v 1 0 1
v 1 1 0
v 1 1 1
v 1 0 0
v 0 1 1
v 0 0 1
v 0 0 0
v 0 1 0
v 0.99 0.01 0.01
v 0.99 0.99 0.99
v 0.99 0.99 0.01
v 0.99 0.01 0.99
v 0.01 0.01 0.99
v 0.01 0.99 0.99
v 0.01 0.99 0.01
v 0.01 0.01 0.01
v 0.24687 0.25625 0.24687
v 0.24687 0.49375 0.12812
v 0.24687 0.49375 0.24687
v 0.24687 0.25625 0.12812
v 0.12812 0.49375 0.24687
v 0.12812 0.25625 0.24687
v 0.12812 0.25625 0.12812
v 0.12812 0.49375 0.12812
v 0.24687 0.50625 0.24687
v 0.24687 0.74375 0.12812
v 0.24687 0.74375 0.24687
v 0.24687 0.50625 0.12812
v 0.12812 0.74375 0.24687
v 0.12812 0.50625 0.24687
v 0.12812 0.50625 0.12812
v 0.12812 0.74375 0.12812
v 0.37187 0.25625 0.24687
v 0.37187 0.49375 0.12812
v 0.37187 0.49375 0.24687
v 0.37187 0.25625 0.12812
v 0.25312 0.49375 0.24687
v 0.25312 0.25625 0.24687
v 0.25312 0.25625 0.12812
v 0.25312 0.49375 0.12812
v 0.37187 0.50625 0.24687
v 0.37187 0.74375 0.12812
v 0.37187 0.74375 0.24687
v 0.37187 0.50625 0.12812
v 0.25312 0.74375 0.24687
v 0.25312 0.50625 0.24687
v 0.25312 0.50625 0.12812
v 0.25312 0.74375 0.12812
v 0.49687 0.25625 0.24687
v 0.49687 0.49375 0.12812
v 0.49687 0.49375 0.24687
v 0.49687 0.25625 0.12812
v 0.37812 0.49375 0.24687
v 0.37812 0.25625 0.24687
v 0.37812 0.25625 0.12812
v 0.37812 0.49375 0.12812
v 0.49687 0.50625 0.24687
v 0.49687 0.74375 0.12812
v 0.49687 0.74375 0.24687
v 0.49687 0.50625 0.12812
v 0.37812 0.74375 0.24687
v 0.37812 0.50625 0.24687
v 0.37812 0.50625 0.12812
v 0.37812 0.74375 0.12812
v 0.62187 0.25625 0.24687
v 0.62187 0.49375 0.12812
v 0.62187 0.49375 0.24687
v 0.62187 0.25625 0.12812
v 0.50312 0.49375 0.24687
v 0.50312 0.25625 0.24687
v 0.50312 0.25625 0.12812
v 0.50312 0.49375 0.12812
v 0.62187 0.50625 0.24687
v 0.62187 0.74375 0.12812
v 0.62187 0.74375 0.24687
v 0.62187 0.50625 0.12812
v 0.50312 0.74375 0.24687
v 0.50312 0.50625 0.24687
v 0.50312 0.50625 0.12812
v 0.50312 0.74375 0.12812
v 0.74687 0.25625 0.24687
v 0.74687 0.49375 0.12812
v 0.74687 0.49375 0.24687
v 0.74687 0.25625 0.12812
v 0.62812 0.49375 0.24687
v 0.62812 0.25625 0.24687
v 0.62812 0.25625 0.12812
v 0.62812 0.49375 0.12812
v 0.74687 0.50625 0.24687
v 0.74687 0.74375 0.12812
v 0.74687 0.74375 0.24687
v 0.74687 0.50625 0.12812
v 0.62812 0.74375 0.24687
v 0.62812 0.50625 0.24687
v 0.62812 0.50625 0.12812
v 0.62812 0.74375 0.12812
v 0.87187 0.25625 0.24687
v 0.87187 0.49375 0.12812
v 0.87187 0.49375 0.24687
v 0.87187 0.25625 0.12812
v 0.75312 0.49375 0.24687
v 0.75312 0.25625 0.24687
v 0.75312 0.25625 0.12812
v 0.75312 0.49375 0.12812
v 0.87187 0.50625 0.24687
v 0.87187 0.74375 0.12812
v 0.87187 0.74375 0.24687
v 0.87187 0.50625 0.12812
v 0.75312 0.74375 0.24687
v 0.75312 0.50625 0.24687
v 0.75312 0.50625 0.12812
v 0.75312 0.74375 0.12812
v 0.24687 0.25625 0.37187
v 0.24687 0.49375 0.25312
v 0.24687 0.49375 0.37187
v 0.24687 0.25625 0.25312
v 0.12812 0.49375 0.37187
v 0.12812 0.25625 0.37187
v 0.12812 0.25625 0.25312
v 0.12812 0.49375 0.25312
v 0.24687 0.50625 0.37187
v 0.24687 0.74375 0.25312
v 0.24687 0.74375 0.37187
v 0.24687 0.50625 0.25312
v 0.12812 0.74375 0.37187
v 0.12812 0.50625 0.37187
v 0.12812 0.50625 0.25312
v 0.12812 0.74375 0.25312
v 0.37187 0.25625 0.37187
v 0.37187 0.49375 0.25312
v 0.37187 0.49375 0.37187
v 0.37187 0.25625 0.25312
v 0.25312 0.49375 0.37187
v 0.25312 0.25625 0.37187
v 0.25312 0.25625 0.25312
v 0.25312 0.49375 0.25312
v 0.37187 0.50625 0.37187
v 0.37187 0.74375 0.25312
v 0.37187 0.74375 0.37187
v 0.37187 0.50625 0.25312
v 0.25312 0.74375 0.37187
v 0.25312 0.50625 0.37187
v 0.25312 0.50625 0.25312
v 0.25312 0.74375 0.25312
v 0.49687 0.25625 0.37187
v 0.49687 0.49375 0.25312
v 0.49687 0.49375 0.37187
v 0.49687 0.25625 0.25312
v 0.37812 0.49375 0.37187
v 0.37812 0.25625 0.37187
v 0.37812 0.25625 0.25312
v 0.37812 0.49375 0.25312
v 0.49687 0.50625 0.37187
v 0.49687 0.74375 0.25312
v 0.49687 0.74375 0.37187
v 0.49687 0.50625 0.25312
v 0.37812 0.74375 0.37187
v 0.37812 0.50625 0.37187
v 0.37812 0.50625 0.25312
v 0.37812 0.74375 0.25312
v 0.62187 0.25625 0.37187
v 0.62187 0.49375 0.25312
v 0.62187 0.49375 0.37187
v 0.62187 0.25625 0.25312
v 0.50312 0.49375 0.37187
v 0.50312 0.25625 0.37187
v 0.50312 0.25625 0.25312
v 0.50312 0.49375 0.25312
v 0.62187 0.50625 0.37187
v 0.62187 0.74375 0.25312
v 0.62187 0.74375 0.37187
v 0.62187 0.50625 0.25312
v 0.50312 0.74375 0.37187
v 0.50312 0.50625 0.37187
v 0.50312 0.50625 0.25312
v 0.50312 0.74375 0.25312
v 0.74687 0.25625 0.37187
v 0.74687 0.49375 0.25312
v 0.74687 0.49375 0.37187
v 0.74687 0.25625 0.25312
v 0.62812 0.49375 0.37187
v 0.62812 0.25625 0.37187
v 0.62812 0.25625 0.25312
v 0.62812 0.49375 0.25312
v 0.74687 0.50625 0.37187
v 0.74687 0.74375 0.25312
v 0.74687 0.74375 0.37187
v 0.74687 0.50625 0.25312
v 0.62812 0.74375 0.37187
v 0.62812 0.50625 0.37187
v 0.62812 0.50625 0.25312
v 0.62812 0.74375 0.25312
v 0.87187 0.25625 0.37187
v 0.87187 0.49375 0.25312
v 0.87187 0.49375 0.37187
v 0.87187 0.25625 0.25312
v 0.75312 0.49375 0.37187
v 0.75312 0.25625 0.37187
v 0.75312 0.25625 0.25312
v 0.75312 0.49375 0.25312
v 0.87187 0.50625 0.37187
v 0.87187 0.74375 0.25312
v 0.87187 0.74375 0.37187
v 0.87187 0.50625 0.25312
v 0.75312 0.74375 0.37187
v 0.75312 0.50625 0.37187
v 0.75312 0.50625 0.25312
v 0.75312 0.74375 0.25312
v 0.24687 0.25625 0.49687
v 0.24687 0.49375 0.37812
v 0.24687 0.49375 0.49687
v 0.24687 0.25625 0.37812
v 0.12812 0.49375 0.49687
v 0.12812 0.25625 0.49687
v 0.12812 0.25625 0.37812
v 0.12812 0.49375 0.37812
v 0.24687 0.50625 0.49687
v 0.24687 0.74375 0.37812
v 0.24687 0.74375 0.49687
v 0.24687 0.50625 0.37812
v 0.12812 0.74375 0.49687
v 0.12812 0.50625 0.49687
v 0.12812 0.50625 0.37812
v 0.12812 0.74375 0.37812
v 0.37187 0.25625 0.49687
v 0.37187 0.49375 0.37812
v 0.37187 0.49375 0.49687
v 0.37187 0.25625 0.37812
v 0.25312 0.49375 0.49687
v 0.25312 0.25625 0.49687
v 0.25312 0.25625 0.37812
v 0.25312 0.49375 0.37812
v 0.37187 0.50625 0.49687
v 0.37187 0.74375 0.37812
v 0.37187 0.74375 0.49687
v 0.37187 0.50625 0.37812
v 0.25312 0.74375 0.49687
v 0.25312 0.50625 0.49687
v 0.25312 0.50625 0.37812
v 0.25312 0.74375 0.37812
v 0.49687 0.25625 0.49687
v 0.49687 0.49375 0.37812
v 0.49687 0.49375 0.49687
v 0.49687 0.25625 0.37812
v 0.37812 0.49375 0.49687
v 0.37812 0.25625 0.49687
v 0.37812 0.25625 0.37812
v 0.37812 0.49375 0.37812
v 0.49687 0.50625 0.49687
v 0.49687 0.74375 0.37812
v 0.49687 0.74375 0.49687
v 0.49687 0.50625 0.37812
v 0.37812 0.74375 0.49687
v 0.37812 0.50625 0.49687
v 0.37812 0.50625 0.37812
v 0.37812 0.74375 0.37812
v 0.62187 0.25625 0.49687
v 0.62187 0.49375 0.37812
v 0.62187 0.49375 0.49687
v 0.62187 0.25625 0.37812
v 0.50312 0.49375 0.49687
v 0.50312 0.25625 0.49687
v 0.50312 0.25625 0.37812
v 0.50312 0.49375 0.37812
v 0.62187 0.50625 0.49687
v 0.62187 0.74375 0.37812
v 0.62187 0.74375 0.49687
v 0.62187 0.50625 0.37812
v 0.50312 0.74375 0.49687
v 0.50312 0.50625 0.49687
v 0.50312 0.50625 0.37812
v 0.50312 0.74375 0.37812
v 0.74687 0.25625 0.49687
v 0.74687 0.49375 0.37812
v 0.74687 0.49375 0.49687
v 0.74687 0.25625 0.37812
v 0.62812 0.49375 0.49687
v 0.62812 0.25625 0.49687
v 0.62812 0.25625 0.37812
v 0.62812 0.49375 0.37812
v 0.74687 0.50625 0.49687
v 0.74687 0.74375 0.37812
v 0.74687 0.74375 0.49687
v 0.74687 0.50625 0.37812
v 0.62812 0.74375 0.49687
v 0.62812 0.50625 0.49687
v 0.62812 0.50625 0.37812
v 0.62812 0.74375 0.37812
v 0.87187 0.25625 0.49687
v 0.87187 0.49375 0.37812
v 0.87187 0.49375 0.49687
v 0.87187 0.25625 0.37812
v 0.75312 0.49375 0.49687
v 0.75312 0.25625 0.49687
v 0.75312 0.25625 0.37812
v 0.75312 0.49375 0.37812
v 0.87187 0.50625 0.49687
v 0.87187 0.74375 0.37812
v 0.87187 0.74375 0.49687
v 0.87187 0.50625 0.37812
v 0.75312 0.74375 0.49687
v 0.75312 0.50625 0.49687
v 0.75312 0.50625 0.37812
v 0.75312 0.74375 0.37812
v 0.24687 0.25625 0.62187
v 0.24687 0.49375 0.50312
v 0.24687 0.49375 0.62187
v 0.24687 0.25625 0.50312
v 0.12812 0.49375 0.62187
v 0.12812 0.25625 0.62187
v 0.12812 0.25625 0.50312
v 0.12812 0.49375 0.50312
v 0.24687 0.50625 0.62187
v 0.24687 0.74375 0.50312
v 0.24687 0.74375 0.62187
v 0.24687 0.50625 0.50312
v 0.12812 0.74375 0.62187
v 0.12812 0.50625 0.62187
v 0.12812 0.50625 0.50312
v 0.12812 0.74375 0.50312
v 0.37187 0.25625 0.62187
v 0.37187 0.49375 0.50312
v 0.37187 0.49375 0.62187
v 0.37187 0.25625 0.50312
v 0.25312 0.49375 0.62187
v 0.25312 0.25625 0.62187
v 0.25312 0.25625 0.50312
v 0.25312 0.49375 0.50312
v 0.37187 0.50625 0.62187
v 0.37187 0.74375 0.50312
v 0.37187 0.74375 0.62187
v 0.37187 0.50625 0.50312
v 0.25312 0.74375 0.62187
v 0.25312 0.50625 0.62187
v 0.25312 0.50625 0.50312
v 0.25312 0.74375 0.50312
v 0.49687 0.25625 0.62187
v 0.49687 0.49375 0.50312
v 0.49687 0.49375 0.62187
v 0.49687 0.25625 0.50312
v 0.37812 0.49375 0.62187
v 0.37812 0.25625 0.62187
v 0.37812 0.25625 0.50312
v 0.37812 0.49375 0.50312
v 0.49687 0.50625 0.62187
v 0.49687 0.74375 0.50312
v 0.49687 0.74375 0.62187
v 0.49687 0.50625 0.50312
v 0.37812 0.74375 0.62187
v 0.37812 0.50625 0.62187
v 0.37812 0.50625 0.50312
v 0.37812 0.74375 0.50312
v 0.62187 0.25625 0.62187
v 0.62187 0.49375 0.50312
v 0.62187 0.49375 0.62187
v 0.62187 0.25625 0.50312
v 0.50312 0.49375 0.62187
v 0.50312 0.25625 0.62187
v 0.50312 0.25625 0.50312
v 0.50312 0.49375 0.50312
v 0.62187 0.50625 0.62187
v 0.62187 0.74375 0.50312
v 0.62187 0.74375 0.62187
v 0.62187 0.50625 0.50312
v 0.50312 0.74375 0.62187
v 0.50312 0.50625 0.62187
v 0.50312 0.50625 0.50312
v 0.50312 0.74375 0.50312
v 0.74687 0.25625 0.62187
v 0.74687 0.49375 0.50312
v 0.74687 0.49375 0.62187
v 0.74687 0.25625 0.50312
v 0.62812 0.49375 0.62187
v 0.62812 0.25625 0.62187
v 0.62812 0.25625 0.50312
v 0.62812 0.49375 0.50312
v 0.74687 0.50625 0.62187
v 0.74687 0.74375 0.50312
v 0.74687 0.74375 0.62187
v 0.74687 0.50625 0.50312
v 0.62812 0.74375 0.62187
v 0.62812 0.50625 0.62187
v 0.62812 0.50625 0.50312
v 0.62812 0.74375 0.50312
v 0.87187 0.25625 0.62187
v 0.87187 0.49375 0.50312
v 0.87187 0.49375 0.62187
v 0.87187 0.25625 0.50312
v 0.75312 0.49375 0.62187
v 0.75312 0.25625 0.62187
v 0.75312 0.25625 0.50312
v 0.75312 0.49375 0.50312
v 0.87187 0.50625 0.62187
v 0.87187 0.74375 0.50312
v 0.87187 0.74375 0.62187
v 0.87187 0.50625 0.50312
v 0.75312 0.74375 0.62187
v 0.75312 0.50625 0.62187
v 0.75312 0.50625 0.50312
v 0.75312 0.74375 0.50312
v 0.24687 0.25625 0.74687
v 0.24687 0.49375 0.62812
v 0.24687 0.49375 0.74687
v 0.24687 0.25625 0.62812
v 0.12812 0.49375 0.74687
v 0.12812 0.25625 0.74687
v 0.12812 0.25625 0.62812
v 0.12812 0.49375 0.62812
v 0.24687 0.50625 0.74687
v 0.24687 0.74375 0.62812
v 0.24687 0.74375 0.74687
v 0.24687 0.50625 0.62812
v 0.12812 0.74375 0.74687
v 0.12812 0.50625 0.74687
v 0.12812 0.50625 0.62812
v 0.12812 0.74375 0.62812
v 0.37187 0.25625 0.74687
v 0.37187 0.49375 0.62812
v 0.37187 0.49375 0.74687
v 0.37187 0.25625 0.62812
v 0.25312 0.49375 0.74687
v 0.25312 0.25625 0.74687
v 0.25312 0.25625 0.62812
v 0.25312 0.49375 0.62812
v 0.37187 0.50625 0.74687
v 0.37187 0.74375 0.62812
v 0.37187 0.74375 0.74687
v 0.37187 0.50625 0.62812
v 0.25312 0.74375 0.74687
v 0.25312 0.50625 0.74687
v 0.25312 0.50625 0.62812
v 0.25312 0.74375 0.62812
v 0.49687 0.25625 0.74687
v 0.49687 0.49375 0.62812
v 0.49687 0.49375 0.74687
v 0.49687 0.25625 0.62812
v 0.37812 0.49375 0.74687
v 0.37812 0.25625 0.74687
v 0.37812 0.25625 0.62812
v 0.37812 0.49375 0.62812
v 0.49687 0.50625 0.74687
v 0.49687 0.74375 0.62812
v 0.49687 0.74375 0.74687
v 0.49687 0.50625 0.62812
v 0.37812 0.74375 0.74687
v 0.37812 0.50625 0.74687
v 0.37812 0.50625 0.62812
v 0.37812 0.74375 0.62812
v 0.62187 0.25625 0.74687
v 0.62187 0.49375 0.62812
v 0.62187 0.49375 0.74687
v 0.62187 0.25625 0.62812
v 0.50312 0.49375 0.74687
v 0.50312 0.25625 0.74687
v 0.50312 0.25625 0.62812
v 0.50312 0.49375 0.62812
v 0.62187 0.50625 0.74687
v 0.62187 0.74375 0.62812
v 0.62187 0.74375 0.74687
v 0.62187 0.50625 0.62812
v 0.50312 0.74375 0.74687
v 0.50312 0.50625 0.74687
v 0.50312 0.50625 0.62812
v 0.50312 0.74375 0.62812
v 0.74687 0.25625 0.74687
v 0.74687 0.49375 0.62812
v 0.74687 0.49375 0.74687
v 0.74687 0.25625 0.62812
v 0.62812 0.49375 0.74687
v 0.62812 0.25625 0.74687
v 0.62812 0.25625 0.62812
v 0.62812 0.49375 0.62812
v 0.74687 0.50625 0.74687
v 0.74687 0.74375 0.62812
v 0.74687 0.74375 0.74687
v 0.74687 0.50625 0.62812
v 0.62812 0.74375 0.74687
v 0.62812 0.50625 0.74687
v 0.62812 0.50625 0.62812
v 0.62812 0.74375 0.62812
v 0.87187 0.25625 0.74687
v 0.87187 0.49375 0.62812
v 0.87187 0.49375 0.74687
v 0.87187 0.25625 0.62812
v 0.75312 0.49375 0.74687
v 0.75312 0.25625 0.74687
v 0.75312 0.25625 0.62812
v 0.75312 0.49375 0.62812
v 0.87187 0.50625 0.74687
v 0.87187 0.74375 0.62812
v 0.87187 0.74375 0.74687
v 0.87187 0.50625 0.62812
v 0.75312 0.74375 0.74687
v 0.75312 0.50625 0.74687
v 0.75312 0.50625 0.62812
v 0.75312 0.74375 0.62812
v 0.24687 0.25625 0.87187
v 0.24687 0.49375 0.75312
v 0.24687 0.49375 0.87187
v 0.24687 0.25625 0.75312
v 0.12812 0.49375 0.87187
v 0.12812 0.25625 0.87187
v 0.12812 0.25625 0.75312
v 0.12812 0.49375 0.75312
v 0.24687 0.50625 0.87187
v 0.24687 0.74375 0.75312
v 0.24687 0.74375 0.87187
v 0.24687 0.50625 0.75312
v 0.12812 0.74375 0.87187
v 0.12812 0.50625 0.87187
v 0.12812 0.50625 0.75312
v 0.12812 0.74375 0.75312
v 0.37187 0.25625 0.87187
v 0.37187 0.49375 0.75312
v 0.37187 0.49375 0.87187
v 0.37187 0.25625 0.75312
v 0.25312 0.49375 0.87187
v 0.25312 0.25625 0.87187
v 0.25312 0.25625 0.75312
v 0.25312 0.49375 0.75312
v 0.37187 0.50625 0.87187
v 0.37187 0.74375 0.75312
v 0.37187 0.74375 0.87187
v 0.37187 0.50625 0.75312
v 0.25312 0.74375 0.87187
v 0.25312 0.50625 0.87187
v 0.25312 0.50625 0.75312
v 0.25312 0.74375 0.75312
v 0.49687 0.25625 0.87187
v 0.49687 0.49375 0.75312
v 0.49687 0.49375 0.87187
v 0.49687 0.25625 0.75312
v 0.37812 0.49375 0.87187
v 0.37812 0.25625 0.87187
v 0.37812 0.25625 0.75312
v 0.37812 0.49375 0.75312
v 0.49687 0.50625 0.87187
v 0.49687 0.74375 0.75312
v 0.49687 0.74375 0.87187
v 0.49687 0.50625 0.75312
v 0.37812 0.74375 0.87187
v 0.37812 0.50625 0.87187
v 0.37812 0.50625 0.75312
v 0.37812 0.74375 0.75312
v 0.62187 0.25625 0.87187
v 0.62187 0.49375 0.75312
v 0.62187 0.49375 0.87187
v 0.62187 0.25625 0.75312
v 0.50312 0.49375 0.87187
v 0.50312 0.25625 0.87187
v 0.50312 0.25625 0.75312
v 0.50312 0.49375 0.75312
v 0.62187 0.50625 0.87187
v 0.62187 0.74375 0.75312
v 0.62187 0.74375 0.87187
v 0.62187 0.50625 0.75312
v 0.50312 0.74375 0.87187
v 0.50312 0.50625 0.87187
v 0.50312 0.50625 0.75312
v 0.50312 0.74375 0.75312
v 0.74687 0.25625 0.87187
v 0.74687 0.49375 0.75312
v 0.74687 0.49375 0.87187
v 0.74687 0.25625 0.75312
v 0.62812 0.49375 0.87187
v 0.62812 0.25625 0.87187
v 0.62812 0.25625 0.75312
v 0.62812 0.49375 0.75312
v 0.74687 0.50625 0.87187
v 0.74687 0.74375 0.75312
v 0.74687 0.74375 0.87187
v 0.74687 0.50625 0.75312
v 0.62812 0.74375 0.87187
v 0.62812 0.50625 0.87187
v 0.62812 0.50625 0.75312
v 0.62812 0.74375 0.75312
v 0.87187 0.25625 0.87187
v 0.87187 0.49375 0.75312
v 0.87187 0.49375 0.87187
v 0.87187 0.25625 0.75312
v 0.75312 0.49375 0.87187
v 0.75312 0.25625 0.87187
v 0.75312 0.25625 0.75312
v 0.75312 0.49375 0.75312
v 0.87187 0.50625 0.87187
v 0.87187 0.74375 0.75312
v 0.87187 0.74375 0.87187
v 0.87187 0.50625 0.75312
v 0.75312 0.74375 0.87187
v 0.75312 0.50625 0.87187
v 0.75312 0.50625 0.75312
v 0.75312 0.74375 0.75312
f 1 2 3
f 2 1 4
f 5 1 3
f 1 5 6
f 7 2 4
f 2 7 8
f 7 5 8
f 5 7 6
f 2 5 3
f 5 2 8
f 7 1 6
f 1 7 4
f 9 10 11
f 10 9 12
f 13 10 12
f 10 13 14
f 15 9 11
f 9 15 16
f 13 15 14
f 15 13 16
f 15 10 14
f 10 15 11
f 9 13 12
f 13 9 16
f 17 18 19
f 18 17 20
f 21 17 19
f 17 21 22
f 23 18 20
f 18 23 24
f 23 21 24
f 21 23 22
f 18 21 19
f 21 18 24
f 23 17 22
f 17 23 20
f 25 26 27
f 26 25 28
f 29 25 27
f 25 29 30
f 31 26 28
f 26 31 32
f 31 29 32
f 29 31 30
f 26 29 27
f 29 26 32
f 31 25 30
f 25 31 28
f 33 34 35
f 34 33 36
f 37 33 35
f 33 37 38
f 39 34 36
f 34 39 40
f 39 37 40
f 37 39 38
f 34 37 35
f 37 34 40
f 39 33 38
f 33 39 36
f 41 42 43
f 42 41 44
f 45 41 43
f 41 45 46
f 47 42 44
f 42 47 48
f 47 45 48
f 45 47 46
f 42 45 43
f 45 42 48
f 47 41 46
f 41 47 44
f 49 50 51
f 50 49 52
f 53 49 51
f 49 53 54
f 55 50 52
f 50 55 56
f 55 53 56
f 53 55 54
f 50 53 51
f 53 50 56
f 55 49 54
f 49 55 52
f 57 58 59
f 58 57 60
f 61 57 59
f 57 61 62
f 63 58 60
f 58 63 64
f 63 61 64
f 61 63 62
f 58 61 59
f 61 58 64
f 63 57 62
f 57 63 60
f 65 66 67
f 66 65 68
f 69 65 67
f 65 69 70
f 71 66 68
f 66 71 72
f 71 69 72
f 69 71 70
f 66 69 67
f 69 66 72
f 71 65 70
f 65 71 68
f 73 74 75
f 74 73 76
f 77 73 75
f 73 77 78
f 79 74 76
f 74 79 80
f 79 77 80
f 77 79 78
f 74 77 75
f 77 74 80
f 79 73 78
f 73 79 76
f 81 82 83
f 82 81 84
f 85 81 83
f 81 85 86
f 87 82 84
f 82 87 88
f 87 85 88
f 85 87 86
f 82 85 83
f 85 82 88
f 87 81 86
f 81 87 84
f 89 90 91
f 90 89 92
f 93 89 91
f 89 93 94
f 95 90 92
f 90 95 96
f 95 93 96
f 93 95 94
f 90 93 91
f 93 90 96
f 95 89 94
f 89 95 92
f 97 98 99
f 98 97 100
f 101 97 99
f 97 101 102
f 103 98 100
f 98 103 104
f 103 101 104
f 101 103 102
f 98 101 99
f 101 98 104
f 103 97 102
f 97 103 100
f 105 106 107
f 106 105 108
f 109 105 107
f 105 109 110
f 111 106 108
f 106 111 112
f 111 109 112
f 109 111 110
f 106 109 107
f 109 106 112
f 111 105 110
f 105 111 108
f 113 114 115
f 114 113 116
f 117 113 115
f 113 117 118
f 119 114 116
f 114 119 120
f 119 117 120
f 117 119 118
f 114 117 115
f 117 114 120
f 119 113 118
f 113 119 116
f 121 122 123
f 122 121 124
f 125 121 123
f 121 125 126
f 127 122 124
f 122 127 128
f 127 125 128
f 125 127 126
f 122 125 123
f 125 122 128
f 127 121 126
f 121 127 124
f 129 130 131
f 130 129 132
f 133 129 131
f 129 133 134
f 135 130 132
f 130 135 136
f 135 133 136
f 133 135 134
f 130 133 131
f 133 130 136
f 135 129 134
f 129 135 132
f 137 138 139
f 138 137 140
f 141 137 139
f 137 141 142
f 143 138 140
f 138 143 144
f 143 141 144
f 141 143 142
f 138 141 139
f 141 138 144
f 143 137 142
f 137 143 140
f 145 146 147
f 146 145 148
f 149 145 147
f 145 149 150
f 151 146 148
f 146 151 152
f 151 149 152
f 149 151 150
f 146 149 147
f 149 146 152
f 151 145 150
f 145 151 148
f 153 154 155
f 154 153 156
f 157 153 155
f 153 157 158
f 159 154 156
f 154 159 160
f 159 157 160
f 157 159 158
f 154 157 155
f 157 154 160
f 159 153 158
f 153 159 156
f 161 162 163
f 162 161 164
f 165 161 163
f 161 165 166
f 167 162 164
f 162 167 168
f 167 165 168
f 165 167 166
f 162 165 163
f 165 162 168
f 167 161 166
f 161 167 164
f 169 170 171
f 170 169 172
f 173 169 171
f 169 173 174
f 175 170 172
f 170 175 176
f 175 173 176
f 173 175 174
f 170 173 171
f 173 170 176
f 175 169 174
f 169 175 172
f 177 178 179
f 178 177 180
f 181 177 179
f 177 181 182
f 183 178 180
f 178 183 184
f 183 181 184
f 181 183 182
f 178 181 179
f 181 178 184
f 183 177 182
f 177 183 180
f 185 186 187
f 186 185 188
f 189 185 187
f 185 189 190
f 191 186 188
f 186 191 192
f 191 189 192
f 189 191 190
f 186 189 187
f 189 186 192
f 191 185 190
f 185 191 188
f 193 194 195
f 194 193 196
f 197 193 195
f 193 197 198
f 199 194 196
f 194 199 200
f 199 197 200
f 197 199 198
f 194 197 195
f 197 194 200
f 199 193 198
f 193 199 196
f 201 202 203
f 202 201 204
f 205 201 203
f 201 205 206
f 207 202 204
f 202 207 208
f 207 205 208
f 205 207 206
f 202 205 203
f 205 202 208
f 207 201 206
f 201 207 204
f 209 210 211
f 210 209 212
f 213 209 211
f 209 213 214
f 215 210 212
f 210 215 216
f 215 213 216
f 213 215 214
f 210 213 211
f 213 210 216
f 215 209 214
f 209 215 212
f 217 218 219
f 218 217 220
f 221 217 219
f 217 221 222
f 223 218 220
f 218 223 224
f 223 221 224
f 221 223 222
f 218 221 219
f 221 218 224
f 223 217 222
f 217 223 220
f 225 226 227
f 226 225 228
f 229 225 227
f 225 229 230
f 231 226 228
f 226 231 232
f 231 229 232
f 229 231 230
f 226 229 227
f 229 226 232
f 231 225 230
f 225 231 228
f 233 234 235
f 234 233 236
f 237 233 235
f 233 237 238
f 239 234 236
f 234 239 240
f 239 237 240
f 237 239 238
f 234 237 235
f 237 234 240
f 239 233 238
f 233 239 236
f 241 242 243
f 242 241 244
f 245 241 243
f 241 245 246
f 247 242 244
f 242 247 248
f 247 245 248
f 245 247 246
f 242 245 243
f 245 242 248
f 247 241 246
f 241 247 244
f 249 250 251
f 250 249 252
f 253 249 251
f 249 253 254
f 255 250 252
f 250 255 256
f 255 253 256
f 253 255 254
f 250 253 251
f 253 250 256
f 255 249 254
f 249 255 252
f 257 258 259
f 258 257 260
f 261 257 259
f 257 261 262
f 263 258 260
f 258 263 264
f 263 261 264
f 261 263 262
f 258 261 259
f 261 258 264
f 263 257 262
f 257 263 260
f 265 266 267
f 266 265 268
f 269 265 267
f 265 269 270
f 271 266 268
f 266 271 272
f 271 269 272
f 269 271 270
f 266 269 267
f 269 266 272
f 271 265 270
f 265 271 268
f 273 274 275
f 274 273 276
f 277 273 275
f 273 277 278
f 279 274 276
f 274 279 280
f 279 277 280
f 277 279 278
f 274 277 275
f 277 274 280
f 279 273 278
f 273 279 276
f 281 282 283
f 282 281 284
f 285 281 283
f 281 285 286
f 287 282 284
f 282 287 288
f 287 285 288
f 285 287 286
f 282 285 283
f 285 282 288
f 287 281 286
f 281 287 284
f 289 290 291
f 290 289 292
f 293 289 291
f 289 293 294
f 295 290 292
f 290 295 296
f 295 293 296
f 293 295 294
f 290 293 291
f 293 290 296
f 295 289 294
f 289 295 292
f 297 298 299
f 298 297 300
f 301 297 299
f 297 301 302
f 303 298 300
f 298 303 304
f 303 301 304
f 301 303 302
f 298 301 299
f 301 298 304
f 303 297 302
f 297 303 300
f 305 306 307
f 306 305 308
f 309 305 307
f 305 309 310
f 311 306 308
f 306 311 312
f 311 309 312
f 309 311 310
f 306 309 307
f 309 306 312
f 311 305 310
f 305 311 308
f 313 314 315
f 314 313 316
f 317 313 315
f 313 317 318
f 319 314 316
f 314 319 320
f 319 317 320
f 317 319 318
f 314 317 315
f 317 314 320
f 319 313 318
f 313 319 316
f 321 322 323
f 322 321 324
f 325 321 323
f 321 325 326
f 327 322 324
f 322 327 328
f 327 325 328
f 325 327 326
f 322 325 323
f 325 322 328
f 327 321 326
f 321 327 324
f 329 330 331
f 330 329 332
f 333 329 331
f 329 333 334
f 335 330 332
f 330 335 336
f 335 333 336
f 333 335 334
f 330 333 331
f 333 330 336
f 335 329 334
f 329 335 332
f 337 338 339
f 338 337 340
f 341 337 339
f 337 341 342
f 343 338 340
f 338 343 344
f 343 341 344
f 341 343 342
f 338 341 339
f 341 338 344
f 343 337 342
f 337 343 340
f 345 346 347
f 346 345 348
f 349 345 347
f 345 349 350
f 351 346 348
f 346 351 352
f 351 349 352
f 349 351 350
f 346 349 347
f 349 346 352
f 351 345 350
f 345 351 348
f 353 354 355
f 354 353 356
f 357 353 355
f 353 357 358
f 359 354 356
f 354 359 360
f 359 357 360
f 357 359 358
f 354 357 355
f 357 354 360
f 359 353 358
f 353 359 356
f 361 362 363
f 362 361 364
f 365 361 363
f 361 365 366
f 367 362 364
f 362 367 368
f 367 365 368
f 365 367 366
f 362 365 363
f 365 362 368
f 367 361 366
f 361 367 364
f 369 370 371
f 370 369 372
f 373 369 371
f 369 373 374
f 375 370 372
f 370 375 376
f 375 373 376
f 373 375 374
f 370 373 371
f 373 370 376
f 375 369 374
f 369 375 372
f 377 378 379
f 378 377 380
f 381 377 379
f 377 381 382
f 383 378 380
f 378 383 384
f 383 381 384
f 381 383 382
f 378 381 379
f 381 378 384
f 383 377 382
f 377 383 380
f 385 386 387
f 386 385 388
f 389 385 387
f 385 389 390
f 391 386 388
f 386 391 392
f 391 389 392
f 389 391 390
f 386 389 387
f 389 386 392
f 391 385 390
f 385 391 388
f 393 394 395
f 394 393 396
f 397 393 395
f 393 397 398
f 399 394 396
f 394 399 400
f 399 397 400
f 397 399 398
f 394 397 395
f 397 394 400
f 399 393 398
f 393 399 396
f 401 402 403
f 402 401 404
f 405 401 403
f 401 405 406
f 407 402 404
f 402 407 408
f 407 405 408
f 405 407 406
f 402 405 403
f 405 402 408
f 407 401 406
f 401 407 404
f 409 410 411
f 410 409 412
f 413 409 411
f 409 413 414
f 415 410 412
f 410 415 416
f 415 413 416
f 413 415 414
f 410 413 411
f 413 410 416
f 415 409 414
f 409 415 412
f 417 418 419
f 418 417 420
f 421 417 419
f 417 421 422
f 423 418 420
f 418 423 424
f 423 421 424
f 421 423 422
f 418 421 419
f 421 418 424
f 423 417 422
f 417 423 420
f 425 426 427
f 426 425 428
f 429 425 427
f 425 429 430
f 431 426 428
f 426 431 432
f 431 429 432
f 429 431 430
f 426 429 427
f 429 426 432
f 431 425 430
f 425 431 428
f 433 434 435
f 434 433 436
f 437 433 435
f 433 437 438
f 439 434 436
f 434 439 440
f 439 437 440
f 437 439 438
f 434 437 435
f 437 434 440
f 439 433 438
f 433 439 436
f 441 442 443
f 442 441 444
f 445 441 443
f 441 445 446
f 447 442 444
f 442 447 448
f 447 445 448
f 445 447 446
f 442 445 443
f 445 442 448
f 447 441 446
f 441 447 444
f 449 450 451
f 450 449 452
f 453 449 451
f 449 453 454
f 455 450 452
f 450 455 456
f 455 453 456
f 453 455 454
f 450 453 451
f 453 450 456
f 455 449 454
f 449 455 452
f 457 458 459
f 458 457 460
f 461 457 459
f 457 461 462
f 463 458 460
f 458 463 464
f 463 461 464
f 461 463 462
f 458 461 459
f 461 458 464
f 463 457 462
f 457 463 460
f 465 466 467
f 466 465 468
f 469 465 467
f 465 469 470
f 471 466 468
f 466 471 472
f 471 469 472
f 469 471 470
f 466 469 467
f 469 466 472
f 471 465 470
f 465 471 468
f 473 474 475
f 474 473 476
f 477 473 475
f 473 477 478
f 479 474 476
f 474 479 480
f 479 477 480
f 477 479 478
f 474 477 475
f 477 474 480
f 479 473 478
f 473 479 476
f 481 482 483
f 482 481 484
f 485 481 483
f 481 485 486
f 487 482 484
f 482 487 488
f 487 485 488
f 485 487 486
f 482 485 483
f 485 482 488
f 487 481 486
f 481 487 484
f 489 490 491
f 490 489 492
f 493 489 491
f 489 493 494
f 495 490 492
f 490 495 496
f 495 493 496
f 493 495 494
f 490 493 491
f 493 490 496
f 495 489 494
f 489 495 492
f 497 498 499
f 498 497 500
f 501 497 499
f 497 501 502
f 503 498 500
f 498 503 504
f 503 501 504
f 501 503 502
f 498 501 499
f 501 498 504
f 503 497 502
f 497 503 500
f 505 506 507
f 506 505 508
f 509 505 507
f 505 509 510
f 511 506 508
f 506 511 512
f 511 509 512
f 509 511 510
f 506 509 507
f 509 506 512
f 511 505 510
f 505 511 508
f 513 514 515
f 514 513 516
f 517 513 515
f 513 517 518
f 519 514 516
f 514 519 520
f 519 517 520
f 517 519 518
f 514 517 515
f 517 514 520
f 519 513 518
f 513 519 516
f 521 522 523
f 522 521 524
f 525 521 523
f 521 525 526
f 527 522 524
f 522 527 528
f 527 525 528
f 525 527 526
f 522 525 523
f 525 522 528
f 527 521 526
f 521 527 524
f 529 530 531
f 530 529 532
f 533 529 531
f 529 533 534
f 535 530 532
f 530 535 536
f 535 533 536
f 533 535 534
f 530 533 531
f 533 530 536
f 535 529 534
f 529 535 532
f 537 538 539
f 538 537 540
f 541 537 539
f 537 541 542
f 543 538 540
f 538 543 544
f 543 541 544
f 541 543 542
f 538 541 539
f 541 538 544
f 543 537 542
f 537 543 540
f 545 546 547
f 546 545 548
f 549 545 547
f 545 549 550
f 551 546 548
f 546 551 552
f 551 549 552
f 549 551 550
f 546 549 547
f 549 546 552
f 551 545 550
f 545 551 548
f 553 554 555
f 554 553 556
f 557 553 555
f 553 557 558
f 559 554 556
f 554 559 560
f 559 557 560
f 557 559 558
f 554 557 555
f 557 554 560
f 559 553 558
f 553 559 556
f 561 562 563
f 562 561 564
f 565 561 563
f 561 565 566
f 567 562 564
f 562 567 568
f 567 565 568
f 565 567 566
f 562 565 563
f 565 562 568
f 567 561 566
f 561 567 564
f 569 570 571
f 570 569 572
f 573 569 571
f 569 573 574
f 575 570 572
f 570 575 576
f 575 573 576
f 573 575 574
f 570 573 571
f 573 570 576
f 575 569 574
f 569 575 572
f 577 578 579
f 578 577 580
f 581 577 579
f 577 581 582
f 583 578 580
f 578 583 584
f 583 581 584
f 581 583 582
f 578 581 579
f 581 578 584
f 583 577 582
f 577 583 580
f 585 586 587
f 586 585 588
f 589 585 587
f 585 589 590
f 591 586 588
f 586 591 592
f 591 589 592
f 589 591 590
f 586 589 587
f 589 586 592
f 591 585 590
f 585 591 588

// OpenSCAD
translate([0.1875, 0.375, 0.1875]) color([0.3519350680925015, 0.6477014615427978, 0.14125726454845833]) cube([0.11875, 0.2375, 0.11875], center=true);
translate([0.1875, 0.625, 0.1875]) color([0.23013900541024712, 0.8285218163248013, 0.9603761550286747]) cube([0.11875, 0.2375, 0.11875], center=true);
translate([0.3125, 0.375, 0.1875]) color([0.6050710034948523, 0.017553655236826726, 0.43262871278032167]) cube([0.11875, 0.2375, 0.11875], center=true);
translate([0.3125, 0.625, 0.1875]) color([0.2571490251669072, 0.4480229944680496, 0.14517873337393172]) cube([0.11875, 0.2375, 0.11875], center=true);
translate([0.4375, 0.375, 0.1875]) color([0.8405131005933094, 0.9776834869331054, 0.10300019528175153]) cube([0.11875, 0.2375, 0.11875], center=true);
translate([0.4375, 0.625, 0.1875]) color([0.998153073210626, 0.8535026464000083, 0.6855970549077809]) cube([0.11875, 0.2375, 0.11875], center=true);
translate([0.5625, 0.375, 0.1875]) color([0.7995005100691247, 0.34047238184459006, 0.1286635278612125]) cube([0.11875, 0.2375, 0.11875], center=true);
translate([0.5625, 0.625, 0.1875]) color([0.6020598448119898, 0.9167847797194366, 0.02081986636819022]) cube([0.11875, 0.2375, 0.11875], center=true);
translate([0.6875, 0.375, 0.1875]) color([0.9135118305629362, 0.3823609034395232, 0.42581309278619206]) cube([0.11875, 0.2375, 0.11875], center=true);
translate([0.6875, 0.625, 0.1875]) color([0.08967296065919184, 0.0016857337534631478, 0.31287848776698257]) cube([0.11875, 0.2375, 0.11875], center=true);
translate([0.8125, 0.375, 0.1875]) color([0.09731792302828757, 0.364404074066101, 0.8754307508322564]) cube([0.11875, 0.2375, 0.11875], center=true);
translate([0.8125, 0.625, 0.1875]) color([0.6967090939923642, 0.5776053806129825, 0.18685318159950626]) cube([0.11875, 0.2375, 0.11875], center=true);
translate([0.1875, 0.375, 0.3125]) color([0.9585806736472646, 0.593334846568766, 0.09927504601217696]) cube([0.11875, 0.2375, 0.11875], center=true);
translate([0.1875, 0.625, 0.3125]) color([0.19313665173925, 0.6863688301261038, 0.2093263356404984]) cube([0.11875, 0.2375, 0.11875], center=true);
translate([0.3125, 0.375, 0.3125]) color([0.2694340379225941, 0.24598969558588324, 0.16092298384524362]) cube([0.11875, 0.2375, 0.11875], center=true);
translate([0.3125, 0.625, 0.3125]) color([0.5102606956149307, 0.431705445139412, 0.38909399282504675]) cube([0.11875, 0.2375, 0.11875], center=true);
translate([0.4375, 0.375, 0.3125]) color([0.3194819673674283, 0.6655357355223767, 0.22692357675811492]) cube([0.11875, 0.2375, 0.11875], center=true);
translate([0.4375, 0.625, 0.3125]) color([0.9464906820257937, 0.35776616524050997, 0.9421064453260054]) cube([0.11875, 0.2375, 0.11875], center=true);
translate([0.5625, 0.375, 0.3125]) color([0.3792404853118415, 0.27508202782836655, 0.9368074710650367]) cube([0.11875, 0.2375, 0.11875], center=true);
translate([0.5625, 0.625, 0.3125]) color([0.7670397757471089, 0.17483880300164423, 0.7474114244696689]) cube([0.11875, 0.2375, 0.11875], center=true);
translate([0.6875, 0.375, 0.3125]) color([0.6015236368594579, 0.5872808850844162, 0.28390336255679416]) cube([0.11875, 0.2375, 0.11875], center=true);
translate([0.6875, 0.625, 0.3125]) color([0.5839405385485582, 0.4048698908705002, 0.6877557316706271]) cube([0.11875, 0.2375, 0.11875], center=true);
translate([0.8125, 0.375, 0.3125]) color([0.29310936231965135, 0.08456113000314536, 0.6409271470126323]) cube([0.11875, 0.2375, 0.11875], center=true);
translate([0.8125, 0.625, 0.3125]) color([0.38512246522478266, 0.6162859510128613, 0.407224705538046]) cube([0.11875, 0.2375, 0.11875], center=true);
translate([0.1875, 0.375, 0.4375]) color([0.6107800780239486, 0.9541913078580654, 0.09369719926319908]) cube([0.11875, 0.2375, 0.11875], center=true);
translate([0.1875, 0.625, 0.4375]) color([0.4396226851829427, 0.9817497074141792, 0.30111933510979894]) cube([0.11875, 0.2375, 0.11875], center=true);
translate([0.3125, 0.375, 0.4375]) color([0.08571041628526821, 0.691130580335744, 0.16573157374072334]) cube([0.11875, 0.2375, 0.11875], center=true);
translate([0.3125, 0.625, 0.4375]) color([0.4668304924867862, 0.30100213617539295, 0.3511677492745029]) cube([0.11875, 0.2375, 0.11875], center=true);
translate([0.4375, 0.375, 0.4375]) color([0.05564944269037686, 0.7696481469448815, 0.686275624239137]) cube([0.11875, 0.2375, 0.11875], center=true);
translate([0.4375, 0.625, 0.4375]) color([0.15447252119296884, 0.35335085758162643, 0.18799175914388588]) cube([0.11875, 0.2375, 0.11875], center=true);
translate([0.5625, 0.375, 0.4375]) color([0.41322879780265653, 0.82270842281296, 0.9057146612667819]) cube([0.11875, 0.2375, 0.11875], center=true);
translate([0.5625, 0.625, 0.4375]) color([0.9688547633127277, 0.5528378273263655, 0.12760284187612392]) cube([0.11875, 0.2375, 0.11875], center=true);
translate([0.6875, 0.375, 0.4375]) color([0.1710979555253146, 0.7131998843266452, 0.6397779425125977]) cube([0.11875, 0.2375, 0.11875], center=true);
translate([0.6875, 0.625, 0.4375]) color([0.57496968906483, 0.8489371230716904, 0.07944838941339594]) cube([0.11875, 0.2375, 0.11875], center=true);
translate([0.8125, 0.375, 0.4375]) color([0.040333123224873146, 0.9305910632054132, 0.3080440975445232]) cube([0.11875, 0.2375, 0.11875], center=true);
translate([0.8125, 0.625, 0.4375]) color([0.6084655882345898, 0.4923441190446234, 0.7069385087242315]) cube([0.11875, 0.2375, 0.11875], center=true);
translate([0.1875, 0.375, 0.5625]) color([0.6803385961846494, 0.18024793645131376, 0.10787678186317007]) cube([0.11875, 0.2375, 0.11875], center=true);
translate([0.1875, 0.625, 0.5625]) color([0.1335624130282893, 0.47731112778056706, 0.8393950916733898]) cube([0.11875, 0.2375, 0.11875], center=true);
translate([0.3125, 0.375, 0.5625]) color([0.6780893207968227, 0.08337096158279222, 0.27725115680544954]) cube([0.11875, 0.2375, 0.11875], center=true);
translate([0.3125, 0.625, 0.5625]) color([0.9965791662073833, 0.03375154870506614, 0.10494976972159242]) cube([0.11875, 0.2375, 0.11875], center=true);
translate([0.4375, 0.375, 0.5625]) color([0.516844917539197, 0.1360610465034362, 0.543805910213663]) cube([0.11875, 0.2375, 0.11875], center=true);
translate([0.4375, 0.625, 0.5625]) color([0.04901628196141694, 0.4867102513994055, 0.8813892002857401]) cube([0.11875, 0.2375, 0.11875], center=true);
translate([0.5625, 0.375, 0.5625]) color([0.3053751014353143, 0.40772022041766365, 0.31297204198076634]) cube([0.11875, 0.2375, 0.11875], center=true);
translate([0.5625, 0.625, 0.5625]) color([0.49907796034366436, 0.6160709555012981, 0.9916538905911245]) cube([0.11875, 0.2375, 0.11875], center=true);
translate([0.6875, 0.375, 0.5625]) color([0.3123575451593331, 0.46364206475662195, 0.8862899719975306]) cube([0.11875, 0.2375, 0.11875], center=true);
translate([0.6875, 0.625, 0.5625]) color([0.5738800220993816, 0.8494037217359881, 0.24323676398212035]) cube([0.11875, 0.2375, 0.11875], center=true);
translate([0.8125, 0.375, 0.5625]) color([0.8402878098664139, 0.9530478541805099, 0.16594803365564914]) cube([0.11875, 0.2375, 0.11875], center=true);
translate([0.8125, 0.625, 0.5625]) color([0.0023370868964924796, 0.7387895340607371, 0.5374530602666081]) cube([0.11875, 0.2375, 0.11875], center=true);
translate([0.1875, 0.375, 0.6875]) color([0.25604025835089217, 0.4320068924153808, 0.5112453323210508]) cube([0.11875, 0.2375, 0.11875], center=true);
translate([0.1875, 0.625, 0.6875]) color([0.7462272619347637, 0.5039790716190428, 0.8850839351693509]) cube([0.11875, 0.2375, 0.11875], center=true);
translate([0.3125, 0.375, 0.6875]) color([0.6652757233710683, 0.22263754843686523, 0.08942086350367451]) cube([0.11875, 0.2375, 0.11875], center=true);
translate([0.3125, 0.625, 0.6875]) color([0.6195232841458308, 0.9036720387350747, 0.7222923954673625]) cube([0.11875, 0.2375, 0.11875], center=true);
translate([0.4375, 0.375, 0.6875]) color([0.6665075097113882, 0.5421139713900744, 0.6943978877819516]) cube([0.11875, 0.2375, 0.11875], center=true);
translate([0.4375, 0.625, 0.6875]) color([0.9269770591996176, 0.12480324665016229, 0.8422397758241813]) cube([0.11875, 0.2375, 0.11875], center=true);
translate([0.5625, 0.375, 0.6875]) color([0.028249143050612435, 0.8554899328562455, 0.6212809598996976]) cube([0.11875, 0.2375, 0.11875], center=true);
translate([0.5625, 0.625, 0.6875]) color([0.6435486749275994, 0.4857227915978113, 0.2898251547629681]) cube([0.11875, 0.2375, 0.11875], center=true);
translate([0.6875, 0.375, 0.6875]) color([0.21709076393122206, 0.4979948584580751, 0.6176241526046676]) cube([0.11875, 0.2375, 0.11875], center=true);
translate([0.6875, 0.625, 0.6875]) color([0.4722249532281336, 0.7228331534363125, 0.6109414561657331]) cube([0.11875, 0.2375, 0.11875], center=true);
translate([0.8125, 0.375, 0.6875]) color([0.5330085163671737, 0.6769359871291822, 0.5973748769978083]) cube([0.11875, 0.2375, 0.11875], center=true);
translate([0.8125, 0.625, 0.6875]) color([0.14460255854654236, 0.21273280877313017, 0.8417179364881341]) cube([0.11875, 0.2375, 0.11875], center=true);
translate([0.1875, 0.375, 0.8125]) color([0.6300391880279899, 0.5103677782275869, 0.4479627161837708]) cube([0.11875, 0.2375, 0.11875], center=true);
translate([0.1875, 0.625, 0.8125]) color([0.2903518628620462, 0.1744676713524972, 0.5457372127765215]) cube([0.11875, 0.2375, 0.11875], center=true);
translate([0.3125, 0.375, 0.8125]) color([0.6340658375422632, 0.7004271366493812, 0.690956934786038]) cube([0.11875, 0.2375, 0.11875], center=true);
translate([0.3125, 0.625, 0.8125]) color([0.013948469234104865, 0.8018456354370093, 0.2607079205191076]) cube([0.11875, 0.2375, 0.11875], center=true);
translate([0.4375, 0.375, 0.8125]) color([0.01899716010339858, 0.7507132946374245, 0.44168653561511173]) cube([0.11875, 0.2375, 0.11875], center=true);
translate([0.4375, 0.625, 0.8125]) color([0.1668653701245908, 0.45955837321901094, 0.7876756969907556]) cube([0.11875, 0.2375, 0.11875], center=true);
translate([0.5625, 0.375, 0.8125]) color([0.09564527702692727, 0.06733136152719421, 0.7816649665975636]) cube([0.11875, 0.2375, 0.11875], center=true);
translate([0.5625, 0.625, 0.8125]) color([0.030385075649315252, 0.33346286891595733, 0.08647112242809318]) cube([0.11875, 0.2375, 0.11875], center=true);
translate([0.6875, 0.375, 0.8125]) color([0.8161439782233904, 0.05657658467482607, 0.8243668117903717]) cube([0.11875, 0.2375, 0.11875], center=true);
translate([0.6875, 0.625, 0.8125]) color([0.05808931884644186, 0.6181904095369413, 0.1426995958976538]) cube([0.11875, 0.2375, 0.11875], center=true);
translate([0.8125, 0.375, 0.8125]) color([0.3846464495954227, 0.3794414211645075, 0.7643773332264734]) cube([0.11875, 0.2375, 0.11875], center=true);
translate([0.8125, 0.625, 0.8125]) color([0.3116889002403487, 0.7690158776827113, 0.7674729074453902]) cube([0.11875, 0.2375, 0.11875], center=true);
color([0.3,0.3,0.3,0.3]) difference() { cube([1,1,1]); translate([0.01,0.01,0.01]) cube([0.98,0.98,0.98]); }
